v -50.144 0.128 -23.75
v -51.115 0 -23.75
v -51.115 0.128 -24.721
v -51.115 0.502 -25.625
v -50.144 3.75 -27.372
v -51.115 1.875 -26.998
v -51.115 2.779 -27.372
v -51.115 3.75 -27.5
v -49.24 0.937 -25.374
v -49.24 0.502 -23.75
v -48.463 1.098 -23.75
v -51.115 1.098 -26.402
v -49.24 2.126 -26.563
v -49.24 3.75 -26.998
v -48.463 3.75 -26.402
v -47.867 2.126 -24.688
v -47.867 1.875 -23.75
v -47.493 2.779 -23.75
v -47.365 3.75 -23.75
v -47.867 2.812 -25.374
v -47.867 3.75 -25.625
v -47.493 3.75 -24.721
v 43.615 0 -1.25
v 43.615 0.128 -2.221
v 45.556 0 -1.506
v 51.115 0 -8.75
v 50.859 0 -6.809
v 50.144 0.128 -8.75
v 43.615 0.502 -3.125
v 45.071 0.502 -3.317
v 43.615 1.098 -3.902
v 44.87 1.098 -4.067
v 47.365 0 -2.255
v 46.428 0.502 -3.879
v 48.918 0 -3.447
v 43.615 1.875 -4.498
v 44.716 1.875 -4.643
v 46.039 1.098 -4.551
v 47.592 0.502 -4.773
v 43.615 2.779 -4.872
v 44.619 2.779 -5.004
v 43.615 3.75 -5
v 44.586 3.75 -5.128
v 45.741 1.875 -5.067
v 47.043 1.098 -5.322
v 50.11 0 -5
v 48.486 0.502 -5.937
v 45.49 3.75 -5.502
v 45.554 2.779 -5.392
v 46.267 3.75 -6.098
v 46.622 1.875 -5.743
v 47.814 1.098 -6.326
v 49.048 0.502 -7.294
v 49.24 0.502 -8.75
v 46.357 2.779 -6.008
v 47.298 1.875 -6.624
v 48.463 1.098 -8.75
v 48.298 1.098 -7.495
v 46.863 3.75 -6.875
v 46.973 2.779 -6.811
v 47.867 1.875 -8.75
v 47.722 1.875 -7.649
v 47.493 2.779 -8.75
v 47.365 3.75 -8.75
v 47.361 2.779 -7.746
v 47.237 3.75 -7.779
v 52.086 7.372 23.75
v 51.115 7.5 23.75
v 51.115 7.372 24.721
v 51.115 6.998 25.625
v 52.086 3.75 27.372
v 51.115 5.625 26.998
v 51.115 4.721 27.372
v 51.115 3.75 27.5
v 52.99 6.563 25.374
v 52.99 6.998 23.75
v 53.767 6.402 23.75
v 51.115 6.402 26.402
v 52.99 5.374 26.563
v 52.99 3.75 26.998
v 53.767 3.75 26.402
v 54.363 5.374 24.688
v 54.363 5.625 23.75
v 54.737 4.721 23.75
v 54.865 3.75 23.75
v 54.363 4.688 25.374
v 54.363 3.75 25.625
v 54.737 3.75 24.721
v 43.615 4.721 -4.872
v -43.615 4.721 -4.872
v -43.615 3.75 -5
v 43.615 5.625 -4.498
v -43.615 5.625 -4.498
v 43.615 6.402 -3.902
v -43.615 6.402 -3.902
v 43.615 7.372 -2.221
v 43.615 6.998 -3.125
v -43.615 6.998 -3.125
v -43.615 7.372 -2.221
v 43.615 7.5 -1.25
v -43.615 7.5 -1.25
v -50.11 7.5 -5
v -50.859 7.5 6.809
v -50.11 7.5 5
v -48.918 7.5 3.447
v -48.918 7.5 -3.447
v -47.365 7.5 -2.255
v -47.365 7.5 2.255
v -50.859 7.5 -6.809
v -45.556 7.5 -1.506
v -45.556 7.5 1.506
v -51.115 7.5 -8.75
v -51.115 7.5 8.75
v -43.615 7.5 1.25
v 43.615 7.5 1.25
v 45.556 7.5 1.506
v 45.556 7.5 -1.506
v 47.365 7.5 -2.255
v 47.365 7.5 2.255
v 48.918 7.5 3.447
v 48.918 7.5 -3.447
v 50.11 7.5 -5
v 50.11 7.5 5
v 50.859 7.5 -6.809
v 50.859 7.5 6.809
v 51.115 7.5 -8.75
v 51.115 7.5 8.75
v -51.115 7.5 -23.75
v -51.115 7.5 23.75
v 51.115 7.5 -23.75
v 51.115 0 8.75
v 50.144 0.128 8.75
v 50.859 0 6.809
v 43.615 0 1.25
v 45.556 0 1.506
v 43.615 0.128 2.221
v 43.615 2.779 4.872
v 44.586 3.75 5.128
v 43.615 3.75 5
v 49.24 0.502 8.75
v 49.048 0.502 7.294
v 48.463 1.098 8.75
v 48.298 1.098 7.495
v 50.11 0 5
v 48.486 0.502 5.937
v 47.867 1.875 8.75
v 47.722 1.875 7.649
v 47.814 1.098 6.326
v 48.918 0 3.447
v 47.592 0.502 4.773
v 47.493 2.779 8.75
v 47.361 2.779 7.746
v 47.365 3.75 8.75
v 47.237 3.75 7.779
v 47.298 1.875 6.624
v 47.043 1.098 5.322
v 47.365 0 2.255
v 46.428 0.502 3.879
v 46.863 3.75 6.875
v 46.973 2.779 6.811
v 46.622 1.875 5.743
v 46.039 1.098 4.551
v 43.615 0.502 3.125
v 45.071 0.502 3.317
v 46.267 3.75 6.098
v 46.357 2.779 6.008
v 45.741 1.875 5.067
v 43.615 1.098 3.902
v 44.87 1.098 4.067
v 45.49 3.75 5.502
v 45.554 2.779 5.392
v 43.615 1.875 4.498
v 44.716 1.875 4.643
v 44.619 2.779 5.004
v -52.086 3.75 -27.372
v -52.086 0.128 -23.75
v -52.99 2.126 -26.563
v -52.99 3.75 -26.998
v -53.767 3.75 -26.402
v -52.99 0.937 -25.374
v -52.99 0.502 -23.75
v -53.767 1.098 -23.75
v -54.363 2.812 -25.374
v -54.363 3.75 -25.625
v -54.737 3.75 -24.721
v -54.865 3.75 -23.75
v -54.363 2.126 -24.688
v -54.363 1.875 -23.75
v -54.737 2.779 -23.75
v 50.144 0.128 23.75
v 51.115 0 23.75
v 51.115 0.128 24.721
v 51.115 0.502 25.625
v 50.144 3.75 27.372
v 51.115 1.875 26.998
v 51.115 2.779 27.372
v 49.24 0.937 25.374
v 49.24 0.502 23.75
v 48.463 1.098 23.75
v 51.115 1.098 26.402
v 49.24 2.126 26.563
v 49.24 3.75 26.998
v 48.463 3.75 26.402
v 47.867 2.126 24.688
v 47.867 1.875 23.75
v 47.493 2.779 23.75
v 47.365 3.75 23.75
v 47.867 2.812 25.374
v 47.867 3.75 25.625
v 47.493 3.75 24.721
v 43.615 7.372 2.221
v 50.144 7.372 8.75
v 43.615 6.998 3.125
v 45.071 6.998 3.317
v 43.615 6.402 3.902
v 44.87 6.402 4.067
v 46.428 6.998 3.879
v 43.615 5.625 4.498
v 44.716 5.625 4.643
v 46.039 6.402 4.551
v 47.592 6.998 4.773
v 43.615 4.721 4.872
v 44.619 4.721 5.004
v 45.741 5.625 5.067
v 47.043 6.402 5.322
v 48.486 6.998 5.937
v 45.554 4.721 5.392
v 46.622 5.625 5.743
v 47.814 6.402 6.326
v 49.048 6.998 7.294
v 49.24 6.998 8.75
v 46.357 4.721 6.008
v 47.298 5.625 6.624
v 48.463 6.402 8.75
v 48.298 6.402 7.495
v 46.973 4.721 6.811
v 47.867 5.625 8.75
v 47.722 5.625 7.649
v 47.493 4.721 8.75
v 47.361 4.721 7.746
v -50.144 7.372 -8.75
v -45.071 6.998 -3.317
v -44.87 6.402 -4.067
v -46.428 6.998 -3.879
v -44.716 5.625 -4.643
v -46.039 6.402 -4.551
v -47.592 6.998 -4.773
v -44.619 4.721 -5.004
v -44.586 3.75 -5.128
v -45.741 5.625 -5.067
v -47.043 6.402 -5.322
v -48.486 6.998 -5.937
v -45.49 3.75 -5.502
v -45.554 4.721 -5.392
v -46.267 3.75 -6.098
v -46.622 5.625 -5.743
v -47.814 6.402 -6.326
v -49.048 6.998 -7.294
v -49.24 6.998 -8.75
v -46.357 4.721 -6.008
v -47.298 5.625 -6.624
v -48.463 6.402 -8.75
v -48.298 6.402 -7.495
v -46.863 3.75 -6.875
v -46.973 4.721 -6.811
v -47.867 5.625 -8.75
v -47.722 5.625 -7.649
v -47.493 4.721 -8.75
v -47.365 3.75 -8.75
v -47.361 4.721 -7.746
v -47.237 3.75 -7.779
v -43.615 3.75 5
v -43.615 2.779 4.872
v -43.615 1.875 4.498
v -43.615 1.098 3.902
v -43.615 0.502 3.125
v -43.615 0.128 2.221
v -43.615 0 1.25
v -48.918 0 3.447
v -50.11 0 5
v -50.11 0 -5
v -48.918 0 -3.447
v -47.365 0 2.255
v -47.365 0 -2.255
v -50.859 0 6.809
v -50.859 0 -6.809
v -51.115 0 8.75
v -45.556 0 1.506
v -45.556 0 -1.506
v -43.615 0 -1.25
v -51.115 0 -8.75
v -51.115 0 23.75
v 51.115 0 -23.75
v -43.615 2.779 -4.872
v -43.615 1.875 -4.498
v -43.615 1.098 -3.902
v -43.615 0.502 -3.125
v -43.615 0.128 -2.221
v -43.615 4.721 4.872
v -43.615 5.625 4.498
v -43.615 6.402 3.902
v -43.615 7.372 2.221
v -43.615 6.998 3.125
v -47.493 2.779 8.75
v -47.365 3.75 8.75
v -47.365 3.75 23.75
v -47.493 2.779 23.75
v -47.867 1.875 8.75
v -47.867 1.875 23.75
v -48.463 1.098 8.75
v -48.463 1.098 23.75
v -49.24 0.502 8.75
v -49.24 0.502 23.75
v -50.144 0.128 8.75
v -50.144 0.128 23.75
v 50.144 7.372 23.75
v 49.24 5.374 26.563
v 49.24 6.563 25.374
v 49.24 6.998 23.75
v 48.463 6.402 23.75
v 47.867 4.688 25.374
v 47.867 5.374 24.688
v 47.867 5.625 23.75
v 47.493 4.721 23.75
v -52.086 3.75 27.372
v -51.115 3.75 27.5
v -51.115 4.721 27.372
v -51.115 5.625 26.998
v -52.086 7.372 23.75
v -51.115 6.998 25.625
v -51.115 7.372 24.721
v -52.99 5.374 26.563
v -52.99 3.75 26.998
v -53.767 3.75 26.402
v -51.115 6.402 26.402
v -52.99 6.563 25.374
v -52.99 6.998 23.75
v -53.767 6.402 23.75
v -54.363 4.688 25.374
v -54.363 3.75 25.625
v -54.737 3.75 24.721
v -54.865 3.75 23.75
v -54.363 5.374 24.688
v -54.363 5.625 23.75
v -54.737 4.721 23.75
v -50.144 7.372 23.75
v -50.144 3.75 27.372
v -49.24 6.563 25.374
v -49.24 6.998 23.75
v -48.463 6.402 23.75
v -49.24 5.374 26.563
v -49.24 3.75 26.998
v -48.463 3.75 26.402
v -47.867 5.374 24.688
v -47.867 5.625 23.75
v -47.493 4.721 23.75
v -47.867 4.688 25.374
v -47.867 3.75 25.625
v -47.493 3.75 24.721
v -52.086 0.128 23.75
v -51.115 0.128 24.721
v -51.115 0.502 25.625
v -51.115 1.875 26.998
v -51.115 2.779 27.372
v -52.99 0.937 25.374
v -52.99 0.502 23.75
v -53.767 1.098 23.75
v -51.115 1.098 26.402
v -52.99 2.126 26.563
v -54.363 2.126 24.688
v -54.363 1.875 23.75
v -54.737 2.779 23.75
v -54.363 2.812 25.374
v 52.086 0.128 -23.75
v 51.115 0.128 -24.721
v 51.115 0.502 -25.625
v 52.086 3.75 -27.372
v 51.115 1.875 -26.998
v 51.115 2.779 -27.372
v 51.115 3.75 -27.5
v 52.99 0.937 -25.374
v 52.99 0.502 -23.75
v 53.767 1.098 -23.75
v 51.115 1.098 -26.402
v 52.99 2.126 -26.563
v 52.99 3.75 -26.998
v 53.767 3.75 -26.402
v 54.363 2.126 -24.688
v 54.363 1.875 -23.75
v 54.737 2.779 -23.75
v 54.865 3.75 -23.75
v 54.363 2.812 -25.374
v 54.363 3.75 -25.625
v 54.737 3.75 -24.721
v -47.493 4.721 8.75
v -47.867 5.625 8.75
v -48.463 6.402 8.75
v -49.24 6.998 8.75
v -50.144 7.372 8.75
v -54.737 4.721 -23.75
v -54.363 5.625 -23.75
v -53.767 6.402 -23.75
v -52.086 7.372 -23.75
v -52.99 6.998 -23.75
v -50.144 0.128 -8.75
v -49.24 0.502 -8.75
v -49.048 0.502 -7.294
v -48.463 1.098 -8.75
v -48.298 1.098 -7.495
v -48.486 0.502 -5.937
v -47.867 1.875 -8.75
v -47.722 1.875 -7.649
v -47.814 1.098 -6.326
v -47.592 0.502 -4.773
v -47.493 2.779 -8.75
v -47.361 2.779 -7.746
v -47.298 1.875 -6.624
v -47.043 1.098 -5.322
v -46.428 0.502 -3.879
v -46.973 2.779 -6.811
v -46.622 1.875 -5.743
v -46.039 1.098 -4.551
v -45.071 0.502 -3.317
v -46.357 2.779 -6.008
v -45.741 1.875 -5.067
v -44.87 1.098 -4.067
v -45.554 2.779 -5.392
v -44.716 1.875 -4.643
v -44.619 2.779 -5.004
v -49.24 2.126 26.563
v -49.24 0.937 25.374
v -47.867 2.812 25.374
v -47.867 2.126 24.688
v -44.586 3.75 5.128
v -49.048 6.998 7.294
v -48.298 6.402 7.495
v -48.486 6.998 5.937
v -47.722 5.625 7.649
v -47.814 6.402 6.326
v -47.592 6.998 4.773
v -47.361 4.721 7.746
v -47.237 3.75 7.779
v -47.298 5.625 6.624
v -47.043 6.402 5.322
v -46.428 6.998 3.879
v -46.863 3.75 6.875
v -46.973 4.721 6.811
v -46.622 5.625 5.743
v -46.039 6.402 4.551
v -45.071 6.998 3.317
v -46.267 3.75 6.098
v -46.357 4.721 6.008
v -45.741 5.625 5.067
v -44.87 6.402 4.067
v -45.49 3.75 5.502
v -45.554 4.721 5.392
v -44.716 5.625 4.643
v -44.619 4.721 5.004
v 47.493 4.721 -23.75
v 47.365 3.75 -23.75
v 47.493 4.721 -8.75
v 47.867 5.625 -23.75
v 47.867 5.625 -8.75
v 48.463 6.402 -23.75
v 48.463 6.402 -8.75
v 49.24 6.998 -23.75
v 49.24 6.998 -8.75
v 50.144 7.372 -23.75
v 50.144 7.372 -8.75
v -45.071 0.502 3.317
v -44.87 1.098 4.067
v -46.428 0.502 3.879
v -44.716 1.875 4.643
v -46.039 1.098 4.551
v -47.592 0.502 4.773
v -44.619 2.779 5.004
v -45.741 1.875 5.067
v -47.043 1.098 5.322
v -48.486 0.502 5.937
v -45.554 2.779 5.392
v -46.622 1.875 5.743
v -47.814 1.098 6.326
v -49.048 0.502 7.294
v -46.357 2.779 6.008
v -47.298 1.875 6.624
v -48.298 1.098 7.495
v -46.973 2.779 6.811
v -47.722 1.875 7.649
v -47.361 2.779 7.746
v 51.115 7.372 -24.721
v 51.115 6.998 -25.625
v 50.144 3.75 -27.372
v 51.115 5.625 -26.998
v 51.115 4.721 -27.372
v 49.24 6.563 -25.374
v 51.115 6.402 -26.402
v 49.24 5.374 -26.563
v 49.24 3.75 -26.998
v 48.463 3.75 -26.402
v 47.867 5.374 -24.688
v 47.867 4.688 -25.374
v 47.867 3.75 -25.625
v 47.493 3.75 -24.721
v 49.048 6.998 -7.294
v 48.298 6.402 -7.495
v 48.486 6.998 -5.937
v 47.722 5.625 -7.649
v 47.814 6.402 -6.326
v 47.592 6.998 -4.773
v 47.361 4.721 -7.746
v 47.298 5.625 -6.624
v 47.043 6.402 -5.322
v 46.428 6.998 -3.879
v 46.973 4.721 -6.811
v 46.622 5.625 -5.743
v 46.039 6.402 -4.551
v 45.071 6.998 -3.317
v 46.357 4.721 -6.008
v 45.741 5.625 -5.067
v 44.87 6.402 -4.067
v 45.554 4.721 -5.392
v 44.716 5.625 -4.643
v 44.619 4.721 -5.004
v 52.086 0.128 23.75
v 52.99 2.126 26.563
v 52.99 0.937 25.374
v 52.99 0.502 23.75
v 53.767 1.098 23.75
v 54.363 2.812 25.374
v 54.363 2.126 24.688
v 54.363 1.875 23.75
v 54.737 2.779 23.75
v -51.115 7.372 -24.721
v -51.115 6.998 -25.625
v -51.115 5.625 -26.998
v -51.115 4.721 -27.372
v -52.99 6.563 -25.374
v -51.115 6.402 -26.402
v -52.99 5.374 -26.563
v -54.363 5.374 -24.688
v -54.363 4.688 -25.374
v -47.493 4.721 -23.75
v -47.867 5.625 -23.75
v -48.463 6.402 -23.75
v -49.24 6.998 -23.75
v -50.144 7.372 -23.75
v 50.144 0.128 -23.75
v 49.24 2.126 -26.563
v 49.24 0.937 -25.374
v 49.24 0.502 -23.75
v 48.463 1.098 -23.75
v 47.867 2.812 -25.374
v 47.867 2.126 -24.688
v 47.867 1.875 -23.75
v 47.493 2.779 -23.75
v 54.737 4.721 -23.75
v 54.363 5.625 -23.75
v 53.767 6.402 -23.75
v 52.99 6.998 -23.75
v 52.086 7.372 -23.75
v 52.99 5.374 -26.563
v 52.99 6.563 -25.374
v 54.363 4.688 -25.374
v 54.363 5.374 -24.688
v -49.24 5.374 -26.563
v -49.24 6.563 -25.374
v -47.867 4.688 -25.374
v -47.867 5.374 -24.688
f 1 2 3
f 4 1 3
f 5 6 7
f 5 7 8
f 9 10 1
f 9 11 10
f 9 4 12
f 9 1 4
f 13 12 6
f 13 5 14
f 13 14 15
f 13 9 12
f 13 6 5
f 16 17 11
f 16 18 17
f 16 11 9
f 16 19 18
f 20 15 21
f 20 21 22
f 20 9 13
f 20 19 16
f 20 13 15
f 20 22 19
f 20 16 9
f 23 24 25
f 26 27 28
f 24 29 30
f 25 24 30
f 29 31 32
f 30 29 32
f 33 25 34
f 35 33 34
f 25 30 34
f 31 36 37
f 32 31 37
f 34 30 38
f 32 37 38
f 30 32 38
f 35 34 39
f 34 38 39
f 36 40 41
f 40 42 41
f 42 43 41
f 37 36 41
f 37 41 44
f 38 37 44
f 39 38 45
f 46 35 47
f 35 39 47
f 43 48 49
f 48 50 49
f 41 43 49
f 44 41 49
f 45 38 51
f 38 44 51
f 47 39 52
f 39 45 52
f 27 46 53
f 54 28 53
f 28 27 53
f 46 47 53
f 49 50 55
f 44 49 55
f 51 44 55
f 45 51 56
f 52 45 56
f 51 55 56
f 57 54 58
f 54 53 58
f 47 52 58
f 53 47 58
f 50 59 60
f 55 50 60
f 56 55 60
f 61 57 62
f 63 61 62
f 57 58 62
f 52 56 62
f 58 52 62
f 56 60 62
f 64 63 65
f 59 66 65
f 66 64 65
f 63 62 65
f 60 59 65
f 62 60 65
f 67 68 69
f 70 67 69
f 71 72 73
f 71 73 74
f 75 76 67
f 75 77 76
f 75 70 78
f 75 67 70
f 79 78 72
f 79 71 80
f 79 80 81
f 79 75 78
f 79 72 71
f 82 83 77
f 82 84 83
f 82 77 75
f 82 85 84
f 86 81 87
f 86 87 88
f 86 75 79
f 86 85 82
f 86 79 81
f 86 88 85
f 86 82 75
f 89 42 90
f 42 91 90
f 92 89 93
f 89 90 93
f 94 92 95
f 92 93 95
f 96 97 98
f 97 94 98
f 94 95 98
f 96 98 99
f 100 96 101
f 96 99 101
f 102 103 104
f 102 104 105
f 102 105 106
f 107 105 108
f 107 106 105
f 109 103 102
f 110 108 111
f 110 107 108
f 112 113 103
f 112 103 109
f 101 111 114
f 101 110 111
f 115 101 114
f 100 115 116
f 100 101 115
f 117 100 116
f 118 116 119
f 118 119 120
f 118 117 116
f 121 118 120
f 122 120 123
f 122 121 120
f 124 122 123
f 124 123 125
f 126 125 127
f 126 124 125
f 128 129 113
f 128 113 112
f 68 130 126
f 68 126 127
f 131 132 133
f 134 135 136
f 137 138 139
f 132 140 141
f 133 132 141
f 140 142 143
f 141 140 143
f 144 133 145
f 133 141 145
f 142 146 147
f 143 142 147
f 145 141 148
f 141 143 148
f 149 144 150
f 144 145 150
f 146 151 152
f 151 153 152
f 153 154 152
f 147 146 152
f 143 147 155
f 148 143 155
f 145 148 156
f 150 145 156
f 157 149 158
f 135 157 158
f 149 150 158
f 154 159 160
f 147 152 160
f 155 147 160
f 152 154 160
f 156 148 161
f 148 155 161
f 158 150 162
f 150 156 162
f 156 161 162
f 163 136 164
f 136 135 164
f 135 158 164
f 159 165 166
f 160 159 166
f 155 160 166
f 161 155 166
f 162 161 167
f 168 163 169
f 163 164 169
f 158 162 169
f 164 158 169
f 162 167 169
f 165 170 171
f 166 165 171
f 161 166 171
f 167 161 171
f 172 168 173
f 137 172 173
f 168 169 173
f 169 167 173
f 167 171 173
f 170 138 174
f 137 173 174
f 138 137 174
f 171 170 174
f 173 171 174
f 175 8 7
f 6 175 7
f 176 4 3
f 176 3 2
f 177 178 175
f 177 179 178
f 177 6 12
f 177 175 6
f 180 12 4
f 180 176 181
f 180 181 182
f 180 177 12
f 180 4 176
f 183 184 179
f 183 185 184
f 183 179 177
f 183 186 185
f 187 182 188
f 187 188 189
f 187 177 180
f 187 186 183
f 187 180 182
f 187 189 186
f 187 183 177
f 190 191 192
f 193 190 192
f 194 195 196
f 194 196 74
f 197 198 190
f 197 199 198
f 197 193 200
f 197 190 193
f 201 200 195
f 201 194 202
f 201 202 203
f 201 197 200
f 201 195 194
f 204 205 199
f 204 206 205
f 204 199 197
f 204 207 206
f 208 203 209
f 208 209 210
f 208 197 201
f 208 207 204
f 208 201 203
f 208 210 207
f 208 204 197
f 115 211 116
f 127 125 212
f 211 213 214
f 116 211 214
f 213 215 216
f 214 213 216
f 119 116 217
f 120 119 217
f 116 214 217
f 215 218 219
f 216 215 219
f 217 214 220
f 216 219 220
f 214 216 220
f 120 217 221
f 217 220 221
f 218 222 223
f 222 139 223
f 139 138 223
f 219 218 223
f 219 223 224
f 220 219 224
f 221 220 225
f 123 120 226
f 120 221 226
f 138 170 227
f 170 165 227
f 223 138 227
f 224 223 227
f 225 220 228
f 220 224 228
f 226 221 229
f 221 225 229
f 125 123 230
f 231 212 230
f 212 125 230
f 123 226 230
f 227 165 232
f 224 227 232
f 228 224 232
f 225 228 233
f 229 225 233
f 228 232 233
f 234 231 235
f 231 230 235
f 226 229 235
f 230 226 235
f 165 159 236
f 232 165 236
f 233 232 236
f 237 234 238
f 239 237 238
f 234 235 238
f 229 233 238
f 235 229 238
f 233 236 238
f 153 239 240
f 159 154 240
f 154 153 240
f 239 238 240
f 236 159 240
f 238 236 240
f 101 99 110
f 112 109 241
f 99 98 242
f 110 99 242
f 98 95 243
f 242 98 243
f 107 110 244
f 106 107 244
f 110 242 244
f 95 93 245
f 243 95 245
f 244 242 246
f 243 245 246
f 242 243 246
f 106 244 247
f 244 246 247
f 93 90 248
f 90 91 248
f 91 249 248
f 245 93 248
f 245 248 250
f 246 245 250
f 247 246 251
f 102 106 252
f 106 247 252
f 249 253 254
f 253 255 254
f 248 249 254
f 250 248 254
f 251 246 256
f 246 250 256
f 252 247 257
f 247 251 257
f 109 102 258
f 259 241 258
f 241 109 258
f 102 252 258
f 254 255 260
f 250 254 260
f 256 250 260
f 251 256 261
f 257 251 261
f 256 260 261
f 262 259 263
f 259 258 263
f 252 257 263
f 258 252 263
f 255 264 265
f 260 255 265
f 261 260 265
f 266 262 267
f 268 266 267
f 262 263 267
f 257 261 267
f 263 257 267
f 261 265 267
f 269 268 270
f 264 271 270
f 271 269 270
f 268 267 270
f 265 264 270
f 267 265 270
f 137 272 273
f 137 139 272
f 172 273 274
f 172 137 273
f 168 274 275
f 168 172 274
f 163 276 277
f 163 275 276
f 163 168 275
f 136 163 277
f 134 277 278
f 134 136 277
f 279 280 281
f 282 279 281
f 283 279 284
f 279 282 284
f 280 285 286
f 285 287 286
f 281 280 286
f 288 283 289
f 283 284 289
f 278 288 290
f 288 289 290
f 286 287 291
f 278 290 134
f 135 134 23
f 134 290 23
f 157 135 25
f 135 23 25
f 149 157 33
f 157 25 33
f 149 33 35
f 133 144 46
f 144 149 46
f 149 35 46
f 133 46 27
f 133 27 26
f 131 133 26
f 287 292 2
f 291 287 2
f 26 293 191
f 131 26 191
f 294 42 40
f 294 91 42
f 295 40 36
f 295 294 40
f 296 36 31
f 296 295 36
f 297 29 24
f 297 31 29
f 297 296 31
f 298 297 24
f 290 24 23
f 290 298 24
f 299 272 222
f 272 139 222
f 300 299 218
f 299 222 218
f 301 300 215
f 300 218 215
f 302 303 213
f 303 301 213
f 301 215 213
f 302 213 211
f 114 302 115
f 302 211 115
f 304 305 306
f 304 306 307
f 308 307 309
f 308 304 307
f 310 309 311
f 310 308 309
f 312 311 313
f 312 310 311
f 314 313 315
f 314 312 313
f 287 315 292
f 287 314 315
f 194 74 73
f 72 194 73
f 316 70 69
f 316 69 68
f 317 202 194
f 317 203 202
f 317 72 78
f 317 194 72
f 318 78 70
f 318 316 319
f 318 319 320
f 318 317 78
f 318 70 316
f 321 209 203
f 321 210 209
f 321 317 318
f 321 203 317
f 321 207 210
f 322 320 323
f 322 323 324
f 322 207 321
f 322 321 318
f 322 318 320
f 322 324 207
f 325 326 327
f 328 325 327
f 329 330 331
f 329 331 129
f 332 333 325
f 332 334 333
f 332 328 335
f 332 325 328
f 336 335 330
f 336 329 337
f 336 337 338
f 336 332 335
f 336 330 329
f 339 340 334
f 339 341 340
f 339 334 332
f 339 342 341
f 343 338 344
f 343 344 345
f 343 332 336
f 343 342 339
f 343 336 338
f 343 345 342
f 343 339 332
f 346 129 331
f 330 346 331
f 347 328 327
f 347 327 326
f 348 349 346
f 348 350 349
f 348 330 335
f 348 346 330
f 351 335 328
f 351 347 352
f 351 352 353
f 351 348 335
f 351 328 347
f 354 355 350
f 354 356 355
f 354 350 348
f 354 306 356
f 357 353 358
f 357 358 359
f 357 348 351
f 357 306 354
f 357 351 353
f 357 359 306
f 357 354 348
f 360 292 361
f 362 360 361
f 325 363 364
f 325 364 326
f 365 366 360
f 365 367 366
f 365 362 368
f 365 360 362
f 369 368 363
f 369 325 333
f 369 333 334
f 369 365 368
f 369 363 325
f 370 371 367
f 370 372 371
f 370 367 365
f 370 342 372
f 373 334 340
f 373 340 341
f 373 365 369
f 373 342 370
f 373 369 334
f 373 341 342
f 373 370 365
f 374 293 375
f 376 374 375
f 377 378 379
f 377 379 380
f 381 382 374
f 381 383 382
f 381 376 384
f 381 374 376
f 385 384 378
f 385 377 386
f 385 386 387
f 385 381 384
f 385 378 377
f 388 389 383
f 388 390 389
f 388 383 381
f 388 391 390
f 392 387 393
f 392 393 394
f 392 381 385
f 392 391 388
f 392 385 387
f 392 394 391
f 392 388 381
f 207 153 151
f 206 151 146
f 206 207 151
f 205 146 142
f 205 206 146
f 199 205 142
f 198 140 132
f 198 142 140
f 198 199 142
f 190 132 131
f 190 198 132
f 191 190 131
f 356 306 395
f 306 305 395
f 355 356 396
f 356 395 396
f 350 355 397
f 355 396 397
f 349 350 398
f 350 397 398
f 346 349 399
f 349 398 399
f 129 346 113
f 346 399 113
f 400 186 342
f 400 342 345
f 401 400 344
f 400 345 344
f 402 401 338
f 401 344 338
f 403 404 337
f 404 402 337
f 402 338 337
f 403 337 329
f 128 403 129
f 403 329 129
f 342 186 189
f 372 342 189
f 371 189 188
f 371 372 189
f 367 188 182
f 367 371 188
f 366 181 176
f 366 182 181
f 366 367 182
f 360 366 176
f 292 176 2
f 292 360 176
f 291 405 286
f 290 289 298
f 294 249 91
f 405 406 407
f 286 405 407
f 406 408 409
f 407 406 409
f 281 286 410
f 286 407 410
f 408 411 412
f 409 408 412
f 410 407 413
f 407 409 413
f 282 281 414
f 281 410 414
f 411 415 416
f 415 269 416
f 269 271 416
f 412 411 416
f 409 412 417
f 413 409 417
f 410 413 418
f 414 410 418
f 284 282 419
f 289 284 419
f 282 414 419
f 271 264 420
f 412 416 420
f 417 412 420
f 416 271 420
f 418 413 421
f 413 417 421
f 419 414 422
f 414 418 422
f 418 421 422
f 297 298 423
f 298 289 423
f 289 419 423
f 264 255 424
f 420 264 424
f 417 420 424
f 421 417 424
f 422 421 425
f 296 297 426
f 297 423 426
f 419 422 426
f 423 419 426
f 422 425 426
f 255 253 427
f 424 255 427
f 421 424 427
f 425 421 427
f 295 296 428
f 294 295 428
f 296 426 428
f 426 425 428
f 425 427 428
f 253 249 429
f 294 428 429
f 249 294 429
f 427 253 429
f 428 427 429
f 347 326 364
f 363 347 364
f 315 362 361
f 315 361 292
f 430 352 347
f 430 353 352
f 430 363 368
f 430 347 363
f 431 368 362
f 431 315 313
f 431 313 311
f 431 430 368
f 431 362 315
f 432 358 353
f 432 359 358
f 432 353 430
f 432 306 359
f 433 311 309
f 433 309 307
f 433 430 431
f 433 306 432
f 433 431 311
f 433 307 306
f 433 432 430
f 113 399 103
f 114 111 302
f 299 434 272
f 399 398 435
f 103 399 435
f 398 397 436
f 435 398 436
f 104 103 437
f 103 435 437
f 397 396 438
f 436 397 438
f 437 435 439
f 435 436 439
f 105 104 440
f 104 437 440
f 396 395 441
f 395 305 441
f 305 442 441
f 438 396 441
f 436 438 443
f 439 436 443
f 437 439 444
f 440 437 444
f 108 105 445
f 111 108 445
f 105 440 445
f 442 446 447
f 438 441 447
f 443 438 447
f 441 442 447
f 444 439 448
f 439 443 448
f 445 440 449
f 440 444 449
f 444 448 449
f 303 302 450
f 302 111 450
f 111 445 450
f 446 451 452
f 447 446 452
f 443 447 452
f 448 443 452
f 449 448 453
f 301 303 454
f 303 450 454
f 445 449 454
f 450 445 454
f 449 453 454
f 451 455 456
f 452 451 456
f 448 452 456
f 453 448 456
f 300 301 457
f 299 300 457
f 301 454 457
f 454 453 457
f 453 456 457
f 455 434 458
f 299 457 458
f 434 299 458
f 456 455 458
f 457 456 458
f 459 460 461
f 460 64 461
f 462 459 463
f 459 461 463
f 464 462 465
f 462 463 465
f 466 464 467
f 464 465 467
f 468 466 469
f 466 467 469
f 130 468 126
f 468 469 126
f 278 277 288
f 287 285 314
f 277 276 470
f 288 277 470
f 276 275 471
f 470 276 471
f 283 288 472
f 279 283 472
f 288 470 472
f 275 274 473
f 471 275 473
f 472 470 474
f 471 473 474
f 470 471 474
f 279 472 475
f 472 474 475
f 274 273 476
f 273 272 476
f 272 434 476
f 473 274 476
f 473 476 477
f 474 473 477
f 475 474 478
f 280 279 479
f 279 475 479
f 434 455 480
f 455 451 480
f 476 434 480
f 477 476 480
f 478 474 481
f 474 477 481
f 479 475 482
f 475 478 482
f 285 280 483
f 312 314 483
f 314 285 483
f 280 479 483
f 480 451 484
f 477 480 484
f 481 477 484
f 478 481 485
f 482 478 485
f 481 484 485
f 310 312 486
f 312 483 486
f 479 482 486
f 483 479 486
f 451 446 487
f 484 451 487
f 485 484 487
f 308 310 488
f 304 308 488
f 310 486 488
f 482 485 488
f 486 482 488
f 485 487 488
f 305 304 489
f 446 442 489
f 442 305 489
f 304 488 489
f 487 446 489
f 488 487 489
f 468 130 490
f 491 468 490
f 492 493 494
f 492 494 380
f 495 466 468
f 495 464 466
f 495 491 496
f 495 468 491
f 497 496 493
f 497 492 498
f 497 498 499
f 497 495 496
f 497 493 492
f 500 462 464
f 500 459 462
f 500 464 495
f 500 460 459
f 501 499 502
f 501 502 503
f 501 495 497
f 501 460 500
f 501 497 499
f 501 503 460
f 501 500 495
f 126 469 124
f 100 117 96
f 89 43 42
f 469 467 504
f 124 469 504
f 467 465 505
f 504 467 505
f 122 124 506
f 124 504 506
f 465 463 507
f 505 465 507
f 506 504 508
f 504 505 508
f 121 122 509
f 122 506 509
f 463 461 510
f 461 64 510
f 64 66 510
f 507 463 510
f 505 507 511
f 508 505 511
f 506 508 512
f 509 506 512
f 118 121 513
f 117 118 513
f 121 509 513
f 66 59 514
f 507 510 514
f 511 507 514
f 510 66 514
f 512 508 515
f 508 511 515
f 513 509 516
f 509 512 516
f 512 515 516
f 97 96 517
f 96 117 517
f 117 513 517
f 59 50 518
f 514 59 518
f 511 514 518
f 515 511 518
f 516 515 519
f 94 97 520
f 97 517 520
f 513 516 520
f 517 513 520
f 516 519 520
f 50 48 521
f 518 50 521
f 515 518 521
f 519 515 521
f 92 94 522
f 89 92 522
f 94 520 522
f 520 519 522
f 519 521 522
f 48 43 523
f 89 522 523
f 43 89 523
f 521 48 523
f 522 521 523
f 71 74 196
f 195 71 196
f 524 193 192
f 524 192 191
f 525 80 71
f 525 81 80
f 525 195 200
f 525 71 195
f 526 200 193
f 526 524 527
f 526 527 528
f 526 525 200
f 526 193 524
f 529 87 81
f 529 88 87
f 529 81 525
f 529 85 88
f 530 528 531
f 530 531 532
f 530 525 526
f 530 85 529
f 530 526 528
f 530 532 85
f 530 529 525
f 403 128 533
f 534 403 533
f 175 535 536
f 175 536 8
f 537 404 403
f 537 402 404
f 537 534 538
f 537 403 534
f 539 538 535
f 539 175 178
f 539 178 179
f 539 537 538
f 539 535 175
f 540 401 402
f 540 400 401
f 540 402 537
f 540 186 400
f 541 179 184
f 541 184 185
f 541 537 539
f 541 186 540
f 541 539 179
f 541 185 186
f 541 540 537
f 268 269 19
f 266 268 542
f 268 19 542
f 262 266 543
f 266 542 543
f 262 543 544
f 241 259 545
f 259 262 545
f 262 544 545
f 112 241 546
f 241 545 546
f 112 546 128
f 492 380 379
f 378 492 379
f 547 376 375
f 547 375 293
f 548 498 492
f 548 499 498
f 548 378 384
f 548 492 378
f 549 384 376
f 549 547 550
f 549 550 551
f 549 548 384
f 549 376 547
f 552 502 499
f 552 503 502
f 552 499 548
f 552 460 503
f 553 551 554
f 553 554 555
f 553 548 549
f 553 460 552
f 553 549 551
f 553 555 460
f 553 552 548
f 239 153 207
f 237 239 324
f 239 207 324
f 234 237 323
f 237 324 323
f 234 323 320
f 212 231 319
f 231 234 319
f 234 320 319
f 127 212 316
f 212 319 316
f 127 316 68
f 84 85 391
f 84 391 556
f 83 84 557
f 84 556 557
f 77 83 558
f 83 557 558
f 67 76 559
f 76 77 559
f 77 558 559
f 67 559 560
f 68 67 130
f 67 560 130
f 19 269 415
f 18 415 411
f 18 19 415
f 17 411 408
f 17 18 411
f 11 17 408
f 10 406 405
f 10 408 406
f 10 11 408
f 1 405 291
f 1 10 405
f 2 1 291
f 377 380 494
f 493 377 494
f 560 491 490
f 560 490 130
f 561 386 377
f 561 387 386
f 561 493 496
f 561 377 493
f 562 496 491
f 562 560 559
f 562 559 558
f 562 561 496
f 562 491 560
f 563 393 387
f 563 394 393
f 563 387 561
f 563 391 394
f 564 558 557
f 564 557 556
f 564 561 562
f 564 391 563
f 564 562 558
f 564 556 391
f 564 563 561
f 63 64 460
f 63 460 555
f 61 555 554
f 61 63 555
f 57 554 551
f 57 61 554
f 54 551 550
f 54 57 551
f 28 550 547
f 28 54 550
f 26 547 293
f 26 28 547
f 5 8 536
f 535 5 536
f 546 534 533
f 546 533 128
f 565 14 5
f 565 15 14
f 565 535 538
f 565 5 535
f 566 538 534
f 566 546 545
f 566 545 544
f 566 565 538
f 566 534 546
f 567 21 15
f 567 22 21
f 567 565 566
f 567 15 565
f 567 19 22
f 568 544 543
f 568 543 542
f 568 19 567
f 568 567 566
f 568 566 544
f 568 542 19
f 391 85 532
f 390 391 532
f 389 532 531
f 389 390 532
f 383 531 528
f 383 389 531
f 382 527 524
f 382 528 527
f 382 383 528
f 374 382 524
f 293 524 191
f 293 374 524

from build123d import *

# Parameters (mm, degrees)
BOSS_EXTRUDE1_DEPTH = 7.5
FILLET1_R           = 3.75
FILLET2_R           = 3.75


# Some blends are built 0.0001 mm under size
with BuildPart() as part:
    # Sketch2 → Boss-Extrude1 (new body)
    with BuildSketch(Plane(origin=(0, 0, 0), x_dir=(1, 0, 0), z_dir=(0, 1, 0))):
        Polygon((-54.865, 27.5), (-54.865, -27.5), (-47.365, -27.5), (-47.365, -5), (47.365, -5), (47.365, -27.5), (54.865, -27.5), (54.865, 27.5), (47.365, 27.5), (47.365, 5), (-47.365, 5), (-47.365, 27.5), align=None)
    extrude(amount=BOSS_EXTRUDE1_DEPTH)

    # Fillet1
    fillet1_edges = [part.edges().sort_by_distance(p)[0] for p in [
        (0, 7.5, 5),
        (-54.865, 0, 0),
        (-47.365, 0, -16.25),
        (0, 0, -5),
        (47.365, 0, -16.25),
        (47.365, 7.5, 16.25),
        (54.865, 0, 0),
        (47.365, 0, 16.25),
        (0, 0, 5),
        (-47.365, 0, 16.25),
        (54.865, 7.5, 0),
        (-54.865, 3.75, 27.5),
        (-54.865, 3.75, -27.5),
        (-47.365, 3.75, -27.5),
        (-47.365, 3.75, -5),
        (47.365, 3.75, -5),
        (47.365, 3.75, -27.5),
        (54.865, 3.75, -27.5),
        (54.865, 3.75, 27.5),
        (47.365, 3.75, 27.5),
        (47.365, 3.75, 5),
        (-47.365, 3.75, 5),
        (-47.365, 3.75, 27.5),
        (47.365, 7.5, -16.25),
        (0, 7.5, -5),
        (-47.365, 7.5, -16.25),
        (-54.865, 7.5, 0),
        (-47.365, 7.5, 16.25),
    ]]
    fillet(fillet1_edges, radius=FILLET1_R - 0.0001)  # a hair under: the kernel refuses the full size

    # Fillet2
    # the kernel refuses this fillet: 3.75 mm, written as the material it takes off along each edge
    with BuildSketch(Plane(origin=(-47.365, 3.75, -23.75), x_dir=(0, 0, -1), z_dir=(0, -1, 0))) as fillet2_piece_1:
        with BuildLine():
            CenterArc((0.0001, -3.7499), 3.7499, 0, 90)
            Line((3.75, -3.7499), (3.75, 0))
            Line((3.75, 0), (0.0001, 0))
        make_face()
    revolve(axis=Axis((-47.365, 3.75, -23.75), (1, 0, 0)), revolution_arc=90, mode=Mode.SUBTRACT)
    with BuildSketch(Plane(origin=(-47.365, 3.75, -23.75), x_dir=(0, -1, 0), z_dir=(0, 0, 1))) as fillet2_piece_2:
        with BuildLine():
            CenterArc((0.0001, -3.7499), 3.7499, 0, 90)
            Line((3.75, -3.7499), (3.75, 0))
            Line((3.75, 0), (0.0001, 0))
        make_face()
    revolve(axis=Axis((-47.365, 3.75, -23.75), (1, 0, 0)), revolution_arc=90, mode=Mode.SUBTRACT)
    with BuildSketch(Plane(origin=(-54.865, 3.75, 23.75), x_dir=(0, 0, 1), z_dir=(0, -1, 0))) as fillet2_piece_3:
        with BuildLine():
            CenterArc((0.0001, -3.7499), 3.7499, 0, 90)
            Line((3.75, -3.7499), (3.75, 0))
            Line((3.75, 0), (0.0001, 0))
        make_face()
    revolve(axis=Axis((-54.865, 3.75, 23.75), (-1, 0, 0)), revolution_arc=90, mode=Mode.SUBTRACT)
    with BuildSketch(Plane(origin=(-54.865, 3.75, 23.75), x_dir=(0, -1, 0), z_dir=(0, 0, -1))) as fillet2_piece_4:
        with BuildLine():
            CenterArc((0.0001, -3.7499), 3.7499, 0, 90)
            Line((3.75, -3.7499), (3.75, 0))
            Line((3.75, 0), (0.0001, 0))
        make_face()
    revolve(axis=Axis((-54.865, 3.75, 23.75), (-1, 0, 0)), revolution_arc=90, mode=Mode.SUBTRACT)
    with BuildSketch(Plane(origin=(47.365, 3.75, 23.75), x_dir=(0, -1, 0), z_dir=(0, 0, -1))) as fillet2_piece_5:
        with BuildLine():
            CenterArc((0.0001, -3.7499), 3.7499, 0, 90)
            Line((3.75, -3.7499), (3.75, 0))
            Line((3.75, 0), (0.0001, 0))
        make_face()
    revolve(axis=Axis((47.365, 3.75, 23.75), (-1, 0, 0)), revolution_arc=90, mode=Mode.SUBTRACT)
    with BuildSketch(Plane(origin=(47.365, 3.75, 23.75), x_dir=(0, 0, 1), z_dir=(0, -1, 0))) as fillet2_piece_6:
        with BuildLine():
            CenterArc((0.0001, -3.7499), 3.7499, 0, 90)
            Line((3.75, -3.7499), (3.75, 0))
            Line((3.75, 0), (0.0001, 0))
        make_face()
    revolve(axis=Axis((47.365, 3.75, 23.75), (-1, 0, 0)), revolution_arc=90, mode=Mode.SUBTRACT)
    with BuildSketch(Plane(origin=(54.865, 3.75, -23.75), x_dir=(0, -1, 0), z_dir=(0, 0, 1))) as fillet2_piece_7:
        with BuildLine():
            CenterArc((0.0001, -3.7499), 3.7499, 0, 90)
            Line((3.75, -3.7499), (3.75, 0))
            Line((3.75, 0), (0.0001, 0))
        make_face()
    revolve(axis=Axis((54.865, 3.75, -23.75), (1, 0, 0)), revolution_arc=90, mode=Mode.SUBTRACT)
    with BuildSketch(Plane(origin=(54.865, 3.75, -23.75), x_dir=(0, 0, -1), z_dir=(0, -1, 0))) as fillet2_piece_8:
        with BuildLine():
            CenterArc((0.0001, -3.7499), 3.7499, 0, 90)
            Line((3.75, -3.7499), (3.75, 0))
            Line((3.75, 0), (0.0001, 0))
        make_face()
    revolve(axis=Axis((54.865, 3.75, -23.75), (1, 0, 0)), revolution_arc=90, mode=Mode.SUBTRACT)
    with BuildSketch(Plane(origin=(-54.865, 3.75, -23.75), x_dir=(0, 1, 0), z_dir=(0, 0, 1))) as fillet2_piece_9:
        with BuildLine():
            CenterArc((0.0001, -3.7499), 3.7499, 0, 90)
            Line((3.75, -3.7499), (3.75, 0))
            Line((3.75, 0), (0.0001, 0))
        make_face()
    revolve(axis=Axis((-54.865, 3.75, -23.75), (-1, 0, 0)), revolution_arc=90, mode=Mode.SUBTRACT)
    with BuildSketch(Plane(origin=(-54.865, 3.75, -23.75), x_dir=(0, 0, -1), z_dir=(0, 1, 0))) as fillet2_piece_10:
        with BuildLine():
            CenterArc((0.0001, -3.7499), 3.7499, 0, 90)
            Line((3.75, -3.7499), (3.75, 0))
            Line((3.75, 0), (0.0001, 0))
        make_face()
    revolve(axis=Axis((-54.865, 3.75, -23.75), (-1, 0, 0)), revolution_arc=90, mode=Mode.SUBTRACT)
    with BuildSketch(Plane(origin=(-47.365, 3.75, 23.75), x_dir=(0, 1, 0), z_dir=(0, 0, -1))) as fillet2_piece_11:
        with BuildLine():
            CenterArc((0.0001, -3.7499), 3.7499, 0, 90)
            Line((3.75, -3.7499), (3.75, 0))
            Line((3.75, 0), (0.0001, 0))
        make_face()
    revolve(axis=Axis((-47.365, 3.75, 23.75), (1, 0, 0)), revolution_arc=90, mode=Mode.SUBTRACT)
    with BuildSketch(Plane(origin=(-47.365, 3.75, 23.75), x_dir=(0, 0, 1), z_dir=(0, 1, 0))) as fillet2_piece_12:
        with BuildLine():
            CenterArc((0.0001, -3.7499), 3.7499, 0, 90)
            Line((3.75, -3.7499), (3.75, 0))
            Line((3.75, 0), (0.0001, 0))
        make_face()
    revolve(axis=Axis((-47.365, 3.75, 23.75), (1, 0, 0)), revolution_arc=90, mode=Mode.SUBTRACT)
    with BuildSketch(Plane(origin=(54.865, 3.75, 23.75), x_dir=(0, 0, 1), z_dir=(0, 1, 0))) as fillet2_piece_13:
        with BuildLine():
            CenterArc((0.0001, -3.7499), 3.7499, 0, 90)
            Line((3.75, -3.7499), (3.75, 0))
            Line((3.75, 0), (0.0001, 0))
        make_face()
    revolve(axis=Axis((54.865, 3.75, 23.75), (1, 0, 0)), revolution_arc=90, mode=Mode.SUBTRACT)
    with BuildSketch(Plane(origin=(54.865, 3.75, 23.75), x_dir=(0, 1, 0), z_dir=(0, 0, -1))) as fillet2_piece_14:
        with BuildLine():
            CenterArc((0.0001, -3.7499), 3.7499, 0, 90)
            Line((3.75, -3.7499), (3.75, 0))
            Line((3.75, 0), (0.0001, 0))
        make_face()
    revolve(axis=Axis((54.865, 3.75, 23.75), (1, 0, 0)), revolution_arc=90, mode=Mode.SUBTRACT)
    with BuildSketch(Plane(origin=(47.365, 3.75, -23.75), x_dir=(0, 0, -1), z_dir=(0, 1, 0))) as fillet2_piece_15:
        with BuildLine():
            CenterArc((0.0001, -3.7499), 3.7499, 0, 90)
            Line((3.75, -3.7499), (3.75, 0))
            Line((3.75, 0), (0.0001, 0))
        make_face()
    revolve(axis=Axis((47.365, 3.75, -23.75), (-1, 0, 0)), revolution_arc=90, mode=Mode.SUBTRACT)
    with BuildSketch(Plane(origin=(47.365, 3.75, -23.75), x_dir=(0, 1, 0), z_dir=(0, 0, 1))) as fillet2_piece_16:
        with BuildLine():
            CenterArc((0.0001, -3.7499), 3.7499, 0, 90)
            Line((3.75, -3.7499), (3.75, 0))
            Line((3.75, 0), (0.0001, 0))
        make_face()
    revolve(axis=Axis((47.365, 3.75, -23.75), (-1, 0, 0)), revolution_arc=90, mode=Mode.SUBTRACT)
    with BuildSketch(Plane(origin=(54.865, 7.5, -27.5), x_dir=(0, 0, 1), z_dir=(-1, 0, 0)), Plane(origin=(47.365, 7.5, 27.5), x_dir=(0, 0, -1), z_dir=(1, 0, 0))) as fillet2_piece_17:
        with BuildLine():
            CenterArc((FILLET2_R, -FILLET2_R), FILLET2_R, 90, 90)
            Line((0, -FILLET2_R), (0, 0))
            Line((0, 0), (FILLET2_R, 0))
        make_face()
    extrude(amount=7.5, mode=Mode.SUBTRACT)
    with BuildSketch(Plane(origin=(54.865, 0, -27.5), x_dir=(0, 0, 1), z_dir=(-1, 0, 0)), Plane(origin=(47.365, 0, 27.5), x_dir=(0, 0, -1), z_dir=(1, 0, 0)), Plane(origin=(-54.865, 0, 27.5), x_dir=(0, 0, -1), z_dir=(1, 0, 0)), Plane(origin=(-54.865, 7.5, 27.5), x_dir=(0, -1, 0), z_dir=(1, 0, 0)), Plane(origin=(-47.365, 0, -27.5), x_dir=(0, 0, 1), z_dir=(-1, 0, 0)), Plane(origin=(-47.365, 7.5, -27.5), x_dir=(0, -1, 0), z_dir=(-1, 0, 0))) as fillet2_piece_18:
        with BuildLine():
            CenterArc((FILLET2_R, FILLET2_R), FILLET2_R, 180, 90)
            Line((0, FILLET2_R), (0, 0))
            Line((0, 0), (FILLET2_R, 0))
        make_face()
    extrude(amount=7.5, mode=Mode.SUBTRACT)


solid = part.part
